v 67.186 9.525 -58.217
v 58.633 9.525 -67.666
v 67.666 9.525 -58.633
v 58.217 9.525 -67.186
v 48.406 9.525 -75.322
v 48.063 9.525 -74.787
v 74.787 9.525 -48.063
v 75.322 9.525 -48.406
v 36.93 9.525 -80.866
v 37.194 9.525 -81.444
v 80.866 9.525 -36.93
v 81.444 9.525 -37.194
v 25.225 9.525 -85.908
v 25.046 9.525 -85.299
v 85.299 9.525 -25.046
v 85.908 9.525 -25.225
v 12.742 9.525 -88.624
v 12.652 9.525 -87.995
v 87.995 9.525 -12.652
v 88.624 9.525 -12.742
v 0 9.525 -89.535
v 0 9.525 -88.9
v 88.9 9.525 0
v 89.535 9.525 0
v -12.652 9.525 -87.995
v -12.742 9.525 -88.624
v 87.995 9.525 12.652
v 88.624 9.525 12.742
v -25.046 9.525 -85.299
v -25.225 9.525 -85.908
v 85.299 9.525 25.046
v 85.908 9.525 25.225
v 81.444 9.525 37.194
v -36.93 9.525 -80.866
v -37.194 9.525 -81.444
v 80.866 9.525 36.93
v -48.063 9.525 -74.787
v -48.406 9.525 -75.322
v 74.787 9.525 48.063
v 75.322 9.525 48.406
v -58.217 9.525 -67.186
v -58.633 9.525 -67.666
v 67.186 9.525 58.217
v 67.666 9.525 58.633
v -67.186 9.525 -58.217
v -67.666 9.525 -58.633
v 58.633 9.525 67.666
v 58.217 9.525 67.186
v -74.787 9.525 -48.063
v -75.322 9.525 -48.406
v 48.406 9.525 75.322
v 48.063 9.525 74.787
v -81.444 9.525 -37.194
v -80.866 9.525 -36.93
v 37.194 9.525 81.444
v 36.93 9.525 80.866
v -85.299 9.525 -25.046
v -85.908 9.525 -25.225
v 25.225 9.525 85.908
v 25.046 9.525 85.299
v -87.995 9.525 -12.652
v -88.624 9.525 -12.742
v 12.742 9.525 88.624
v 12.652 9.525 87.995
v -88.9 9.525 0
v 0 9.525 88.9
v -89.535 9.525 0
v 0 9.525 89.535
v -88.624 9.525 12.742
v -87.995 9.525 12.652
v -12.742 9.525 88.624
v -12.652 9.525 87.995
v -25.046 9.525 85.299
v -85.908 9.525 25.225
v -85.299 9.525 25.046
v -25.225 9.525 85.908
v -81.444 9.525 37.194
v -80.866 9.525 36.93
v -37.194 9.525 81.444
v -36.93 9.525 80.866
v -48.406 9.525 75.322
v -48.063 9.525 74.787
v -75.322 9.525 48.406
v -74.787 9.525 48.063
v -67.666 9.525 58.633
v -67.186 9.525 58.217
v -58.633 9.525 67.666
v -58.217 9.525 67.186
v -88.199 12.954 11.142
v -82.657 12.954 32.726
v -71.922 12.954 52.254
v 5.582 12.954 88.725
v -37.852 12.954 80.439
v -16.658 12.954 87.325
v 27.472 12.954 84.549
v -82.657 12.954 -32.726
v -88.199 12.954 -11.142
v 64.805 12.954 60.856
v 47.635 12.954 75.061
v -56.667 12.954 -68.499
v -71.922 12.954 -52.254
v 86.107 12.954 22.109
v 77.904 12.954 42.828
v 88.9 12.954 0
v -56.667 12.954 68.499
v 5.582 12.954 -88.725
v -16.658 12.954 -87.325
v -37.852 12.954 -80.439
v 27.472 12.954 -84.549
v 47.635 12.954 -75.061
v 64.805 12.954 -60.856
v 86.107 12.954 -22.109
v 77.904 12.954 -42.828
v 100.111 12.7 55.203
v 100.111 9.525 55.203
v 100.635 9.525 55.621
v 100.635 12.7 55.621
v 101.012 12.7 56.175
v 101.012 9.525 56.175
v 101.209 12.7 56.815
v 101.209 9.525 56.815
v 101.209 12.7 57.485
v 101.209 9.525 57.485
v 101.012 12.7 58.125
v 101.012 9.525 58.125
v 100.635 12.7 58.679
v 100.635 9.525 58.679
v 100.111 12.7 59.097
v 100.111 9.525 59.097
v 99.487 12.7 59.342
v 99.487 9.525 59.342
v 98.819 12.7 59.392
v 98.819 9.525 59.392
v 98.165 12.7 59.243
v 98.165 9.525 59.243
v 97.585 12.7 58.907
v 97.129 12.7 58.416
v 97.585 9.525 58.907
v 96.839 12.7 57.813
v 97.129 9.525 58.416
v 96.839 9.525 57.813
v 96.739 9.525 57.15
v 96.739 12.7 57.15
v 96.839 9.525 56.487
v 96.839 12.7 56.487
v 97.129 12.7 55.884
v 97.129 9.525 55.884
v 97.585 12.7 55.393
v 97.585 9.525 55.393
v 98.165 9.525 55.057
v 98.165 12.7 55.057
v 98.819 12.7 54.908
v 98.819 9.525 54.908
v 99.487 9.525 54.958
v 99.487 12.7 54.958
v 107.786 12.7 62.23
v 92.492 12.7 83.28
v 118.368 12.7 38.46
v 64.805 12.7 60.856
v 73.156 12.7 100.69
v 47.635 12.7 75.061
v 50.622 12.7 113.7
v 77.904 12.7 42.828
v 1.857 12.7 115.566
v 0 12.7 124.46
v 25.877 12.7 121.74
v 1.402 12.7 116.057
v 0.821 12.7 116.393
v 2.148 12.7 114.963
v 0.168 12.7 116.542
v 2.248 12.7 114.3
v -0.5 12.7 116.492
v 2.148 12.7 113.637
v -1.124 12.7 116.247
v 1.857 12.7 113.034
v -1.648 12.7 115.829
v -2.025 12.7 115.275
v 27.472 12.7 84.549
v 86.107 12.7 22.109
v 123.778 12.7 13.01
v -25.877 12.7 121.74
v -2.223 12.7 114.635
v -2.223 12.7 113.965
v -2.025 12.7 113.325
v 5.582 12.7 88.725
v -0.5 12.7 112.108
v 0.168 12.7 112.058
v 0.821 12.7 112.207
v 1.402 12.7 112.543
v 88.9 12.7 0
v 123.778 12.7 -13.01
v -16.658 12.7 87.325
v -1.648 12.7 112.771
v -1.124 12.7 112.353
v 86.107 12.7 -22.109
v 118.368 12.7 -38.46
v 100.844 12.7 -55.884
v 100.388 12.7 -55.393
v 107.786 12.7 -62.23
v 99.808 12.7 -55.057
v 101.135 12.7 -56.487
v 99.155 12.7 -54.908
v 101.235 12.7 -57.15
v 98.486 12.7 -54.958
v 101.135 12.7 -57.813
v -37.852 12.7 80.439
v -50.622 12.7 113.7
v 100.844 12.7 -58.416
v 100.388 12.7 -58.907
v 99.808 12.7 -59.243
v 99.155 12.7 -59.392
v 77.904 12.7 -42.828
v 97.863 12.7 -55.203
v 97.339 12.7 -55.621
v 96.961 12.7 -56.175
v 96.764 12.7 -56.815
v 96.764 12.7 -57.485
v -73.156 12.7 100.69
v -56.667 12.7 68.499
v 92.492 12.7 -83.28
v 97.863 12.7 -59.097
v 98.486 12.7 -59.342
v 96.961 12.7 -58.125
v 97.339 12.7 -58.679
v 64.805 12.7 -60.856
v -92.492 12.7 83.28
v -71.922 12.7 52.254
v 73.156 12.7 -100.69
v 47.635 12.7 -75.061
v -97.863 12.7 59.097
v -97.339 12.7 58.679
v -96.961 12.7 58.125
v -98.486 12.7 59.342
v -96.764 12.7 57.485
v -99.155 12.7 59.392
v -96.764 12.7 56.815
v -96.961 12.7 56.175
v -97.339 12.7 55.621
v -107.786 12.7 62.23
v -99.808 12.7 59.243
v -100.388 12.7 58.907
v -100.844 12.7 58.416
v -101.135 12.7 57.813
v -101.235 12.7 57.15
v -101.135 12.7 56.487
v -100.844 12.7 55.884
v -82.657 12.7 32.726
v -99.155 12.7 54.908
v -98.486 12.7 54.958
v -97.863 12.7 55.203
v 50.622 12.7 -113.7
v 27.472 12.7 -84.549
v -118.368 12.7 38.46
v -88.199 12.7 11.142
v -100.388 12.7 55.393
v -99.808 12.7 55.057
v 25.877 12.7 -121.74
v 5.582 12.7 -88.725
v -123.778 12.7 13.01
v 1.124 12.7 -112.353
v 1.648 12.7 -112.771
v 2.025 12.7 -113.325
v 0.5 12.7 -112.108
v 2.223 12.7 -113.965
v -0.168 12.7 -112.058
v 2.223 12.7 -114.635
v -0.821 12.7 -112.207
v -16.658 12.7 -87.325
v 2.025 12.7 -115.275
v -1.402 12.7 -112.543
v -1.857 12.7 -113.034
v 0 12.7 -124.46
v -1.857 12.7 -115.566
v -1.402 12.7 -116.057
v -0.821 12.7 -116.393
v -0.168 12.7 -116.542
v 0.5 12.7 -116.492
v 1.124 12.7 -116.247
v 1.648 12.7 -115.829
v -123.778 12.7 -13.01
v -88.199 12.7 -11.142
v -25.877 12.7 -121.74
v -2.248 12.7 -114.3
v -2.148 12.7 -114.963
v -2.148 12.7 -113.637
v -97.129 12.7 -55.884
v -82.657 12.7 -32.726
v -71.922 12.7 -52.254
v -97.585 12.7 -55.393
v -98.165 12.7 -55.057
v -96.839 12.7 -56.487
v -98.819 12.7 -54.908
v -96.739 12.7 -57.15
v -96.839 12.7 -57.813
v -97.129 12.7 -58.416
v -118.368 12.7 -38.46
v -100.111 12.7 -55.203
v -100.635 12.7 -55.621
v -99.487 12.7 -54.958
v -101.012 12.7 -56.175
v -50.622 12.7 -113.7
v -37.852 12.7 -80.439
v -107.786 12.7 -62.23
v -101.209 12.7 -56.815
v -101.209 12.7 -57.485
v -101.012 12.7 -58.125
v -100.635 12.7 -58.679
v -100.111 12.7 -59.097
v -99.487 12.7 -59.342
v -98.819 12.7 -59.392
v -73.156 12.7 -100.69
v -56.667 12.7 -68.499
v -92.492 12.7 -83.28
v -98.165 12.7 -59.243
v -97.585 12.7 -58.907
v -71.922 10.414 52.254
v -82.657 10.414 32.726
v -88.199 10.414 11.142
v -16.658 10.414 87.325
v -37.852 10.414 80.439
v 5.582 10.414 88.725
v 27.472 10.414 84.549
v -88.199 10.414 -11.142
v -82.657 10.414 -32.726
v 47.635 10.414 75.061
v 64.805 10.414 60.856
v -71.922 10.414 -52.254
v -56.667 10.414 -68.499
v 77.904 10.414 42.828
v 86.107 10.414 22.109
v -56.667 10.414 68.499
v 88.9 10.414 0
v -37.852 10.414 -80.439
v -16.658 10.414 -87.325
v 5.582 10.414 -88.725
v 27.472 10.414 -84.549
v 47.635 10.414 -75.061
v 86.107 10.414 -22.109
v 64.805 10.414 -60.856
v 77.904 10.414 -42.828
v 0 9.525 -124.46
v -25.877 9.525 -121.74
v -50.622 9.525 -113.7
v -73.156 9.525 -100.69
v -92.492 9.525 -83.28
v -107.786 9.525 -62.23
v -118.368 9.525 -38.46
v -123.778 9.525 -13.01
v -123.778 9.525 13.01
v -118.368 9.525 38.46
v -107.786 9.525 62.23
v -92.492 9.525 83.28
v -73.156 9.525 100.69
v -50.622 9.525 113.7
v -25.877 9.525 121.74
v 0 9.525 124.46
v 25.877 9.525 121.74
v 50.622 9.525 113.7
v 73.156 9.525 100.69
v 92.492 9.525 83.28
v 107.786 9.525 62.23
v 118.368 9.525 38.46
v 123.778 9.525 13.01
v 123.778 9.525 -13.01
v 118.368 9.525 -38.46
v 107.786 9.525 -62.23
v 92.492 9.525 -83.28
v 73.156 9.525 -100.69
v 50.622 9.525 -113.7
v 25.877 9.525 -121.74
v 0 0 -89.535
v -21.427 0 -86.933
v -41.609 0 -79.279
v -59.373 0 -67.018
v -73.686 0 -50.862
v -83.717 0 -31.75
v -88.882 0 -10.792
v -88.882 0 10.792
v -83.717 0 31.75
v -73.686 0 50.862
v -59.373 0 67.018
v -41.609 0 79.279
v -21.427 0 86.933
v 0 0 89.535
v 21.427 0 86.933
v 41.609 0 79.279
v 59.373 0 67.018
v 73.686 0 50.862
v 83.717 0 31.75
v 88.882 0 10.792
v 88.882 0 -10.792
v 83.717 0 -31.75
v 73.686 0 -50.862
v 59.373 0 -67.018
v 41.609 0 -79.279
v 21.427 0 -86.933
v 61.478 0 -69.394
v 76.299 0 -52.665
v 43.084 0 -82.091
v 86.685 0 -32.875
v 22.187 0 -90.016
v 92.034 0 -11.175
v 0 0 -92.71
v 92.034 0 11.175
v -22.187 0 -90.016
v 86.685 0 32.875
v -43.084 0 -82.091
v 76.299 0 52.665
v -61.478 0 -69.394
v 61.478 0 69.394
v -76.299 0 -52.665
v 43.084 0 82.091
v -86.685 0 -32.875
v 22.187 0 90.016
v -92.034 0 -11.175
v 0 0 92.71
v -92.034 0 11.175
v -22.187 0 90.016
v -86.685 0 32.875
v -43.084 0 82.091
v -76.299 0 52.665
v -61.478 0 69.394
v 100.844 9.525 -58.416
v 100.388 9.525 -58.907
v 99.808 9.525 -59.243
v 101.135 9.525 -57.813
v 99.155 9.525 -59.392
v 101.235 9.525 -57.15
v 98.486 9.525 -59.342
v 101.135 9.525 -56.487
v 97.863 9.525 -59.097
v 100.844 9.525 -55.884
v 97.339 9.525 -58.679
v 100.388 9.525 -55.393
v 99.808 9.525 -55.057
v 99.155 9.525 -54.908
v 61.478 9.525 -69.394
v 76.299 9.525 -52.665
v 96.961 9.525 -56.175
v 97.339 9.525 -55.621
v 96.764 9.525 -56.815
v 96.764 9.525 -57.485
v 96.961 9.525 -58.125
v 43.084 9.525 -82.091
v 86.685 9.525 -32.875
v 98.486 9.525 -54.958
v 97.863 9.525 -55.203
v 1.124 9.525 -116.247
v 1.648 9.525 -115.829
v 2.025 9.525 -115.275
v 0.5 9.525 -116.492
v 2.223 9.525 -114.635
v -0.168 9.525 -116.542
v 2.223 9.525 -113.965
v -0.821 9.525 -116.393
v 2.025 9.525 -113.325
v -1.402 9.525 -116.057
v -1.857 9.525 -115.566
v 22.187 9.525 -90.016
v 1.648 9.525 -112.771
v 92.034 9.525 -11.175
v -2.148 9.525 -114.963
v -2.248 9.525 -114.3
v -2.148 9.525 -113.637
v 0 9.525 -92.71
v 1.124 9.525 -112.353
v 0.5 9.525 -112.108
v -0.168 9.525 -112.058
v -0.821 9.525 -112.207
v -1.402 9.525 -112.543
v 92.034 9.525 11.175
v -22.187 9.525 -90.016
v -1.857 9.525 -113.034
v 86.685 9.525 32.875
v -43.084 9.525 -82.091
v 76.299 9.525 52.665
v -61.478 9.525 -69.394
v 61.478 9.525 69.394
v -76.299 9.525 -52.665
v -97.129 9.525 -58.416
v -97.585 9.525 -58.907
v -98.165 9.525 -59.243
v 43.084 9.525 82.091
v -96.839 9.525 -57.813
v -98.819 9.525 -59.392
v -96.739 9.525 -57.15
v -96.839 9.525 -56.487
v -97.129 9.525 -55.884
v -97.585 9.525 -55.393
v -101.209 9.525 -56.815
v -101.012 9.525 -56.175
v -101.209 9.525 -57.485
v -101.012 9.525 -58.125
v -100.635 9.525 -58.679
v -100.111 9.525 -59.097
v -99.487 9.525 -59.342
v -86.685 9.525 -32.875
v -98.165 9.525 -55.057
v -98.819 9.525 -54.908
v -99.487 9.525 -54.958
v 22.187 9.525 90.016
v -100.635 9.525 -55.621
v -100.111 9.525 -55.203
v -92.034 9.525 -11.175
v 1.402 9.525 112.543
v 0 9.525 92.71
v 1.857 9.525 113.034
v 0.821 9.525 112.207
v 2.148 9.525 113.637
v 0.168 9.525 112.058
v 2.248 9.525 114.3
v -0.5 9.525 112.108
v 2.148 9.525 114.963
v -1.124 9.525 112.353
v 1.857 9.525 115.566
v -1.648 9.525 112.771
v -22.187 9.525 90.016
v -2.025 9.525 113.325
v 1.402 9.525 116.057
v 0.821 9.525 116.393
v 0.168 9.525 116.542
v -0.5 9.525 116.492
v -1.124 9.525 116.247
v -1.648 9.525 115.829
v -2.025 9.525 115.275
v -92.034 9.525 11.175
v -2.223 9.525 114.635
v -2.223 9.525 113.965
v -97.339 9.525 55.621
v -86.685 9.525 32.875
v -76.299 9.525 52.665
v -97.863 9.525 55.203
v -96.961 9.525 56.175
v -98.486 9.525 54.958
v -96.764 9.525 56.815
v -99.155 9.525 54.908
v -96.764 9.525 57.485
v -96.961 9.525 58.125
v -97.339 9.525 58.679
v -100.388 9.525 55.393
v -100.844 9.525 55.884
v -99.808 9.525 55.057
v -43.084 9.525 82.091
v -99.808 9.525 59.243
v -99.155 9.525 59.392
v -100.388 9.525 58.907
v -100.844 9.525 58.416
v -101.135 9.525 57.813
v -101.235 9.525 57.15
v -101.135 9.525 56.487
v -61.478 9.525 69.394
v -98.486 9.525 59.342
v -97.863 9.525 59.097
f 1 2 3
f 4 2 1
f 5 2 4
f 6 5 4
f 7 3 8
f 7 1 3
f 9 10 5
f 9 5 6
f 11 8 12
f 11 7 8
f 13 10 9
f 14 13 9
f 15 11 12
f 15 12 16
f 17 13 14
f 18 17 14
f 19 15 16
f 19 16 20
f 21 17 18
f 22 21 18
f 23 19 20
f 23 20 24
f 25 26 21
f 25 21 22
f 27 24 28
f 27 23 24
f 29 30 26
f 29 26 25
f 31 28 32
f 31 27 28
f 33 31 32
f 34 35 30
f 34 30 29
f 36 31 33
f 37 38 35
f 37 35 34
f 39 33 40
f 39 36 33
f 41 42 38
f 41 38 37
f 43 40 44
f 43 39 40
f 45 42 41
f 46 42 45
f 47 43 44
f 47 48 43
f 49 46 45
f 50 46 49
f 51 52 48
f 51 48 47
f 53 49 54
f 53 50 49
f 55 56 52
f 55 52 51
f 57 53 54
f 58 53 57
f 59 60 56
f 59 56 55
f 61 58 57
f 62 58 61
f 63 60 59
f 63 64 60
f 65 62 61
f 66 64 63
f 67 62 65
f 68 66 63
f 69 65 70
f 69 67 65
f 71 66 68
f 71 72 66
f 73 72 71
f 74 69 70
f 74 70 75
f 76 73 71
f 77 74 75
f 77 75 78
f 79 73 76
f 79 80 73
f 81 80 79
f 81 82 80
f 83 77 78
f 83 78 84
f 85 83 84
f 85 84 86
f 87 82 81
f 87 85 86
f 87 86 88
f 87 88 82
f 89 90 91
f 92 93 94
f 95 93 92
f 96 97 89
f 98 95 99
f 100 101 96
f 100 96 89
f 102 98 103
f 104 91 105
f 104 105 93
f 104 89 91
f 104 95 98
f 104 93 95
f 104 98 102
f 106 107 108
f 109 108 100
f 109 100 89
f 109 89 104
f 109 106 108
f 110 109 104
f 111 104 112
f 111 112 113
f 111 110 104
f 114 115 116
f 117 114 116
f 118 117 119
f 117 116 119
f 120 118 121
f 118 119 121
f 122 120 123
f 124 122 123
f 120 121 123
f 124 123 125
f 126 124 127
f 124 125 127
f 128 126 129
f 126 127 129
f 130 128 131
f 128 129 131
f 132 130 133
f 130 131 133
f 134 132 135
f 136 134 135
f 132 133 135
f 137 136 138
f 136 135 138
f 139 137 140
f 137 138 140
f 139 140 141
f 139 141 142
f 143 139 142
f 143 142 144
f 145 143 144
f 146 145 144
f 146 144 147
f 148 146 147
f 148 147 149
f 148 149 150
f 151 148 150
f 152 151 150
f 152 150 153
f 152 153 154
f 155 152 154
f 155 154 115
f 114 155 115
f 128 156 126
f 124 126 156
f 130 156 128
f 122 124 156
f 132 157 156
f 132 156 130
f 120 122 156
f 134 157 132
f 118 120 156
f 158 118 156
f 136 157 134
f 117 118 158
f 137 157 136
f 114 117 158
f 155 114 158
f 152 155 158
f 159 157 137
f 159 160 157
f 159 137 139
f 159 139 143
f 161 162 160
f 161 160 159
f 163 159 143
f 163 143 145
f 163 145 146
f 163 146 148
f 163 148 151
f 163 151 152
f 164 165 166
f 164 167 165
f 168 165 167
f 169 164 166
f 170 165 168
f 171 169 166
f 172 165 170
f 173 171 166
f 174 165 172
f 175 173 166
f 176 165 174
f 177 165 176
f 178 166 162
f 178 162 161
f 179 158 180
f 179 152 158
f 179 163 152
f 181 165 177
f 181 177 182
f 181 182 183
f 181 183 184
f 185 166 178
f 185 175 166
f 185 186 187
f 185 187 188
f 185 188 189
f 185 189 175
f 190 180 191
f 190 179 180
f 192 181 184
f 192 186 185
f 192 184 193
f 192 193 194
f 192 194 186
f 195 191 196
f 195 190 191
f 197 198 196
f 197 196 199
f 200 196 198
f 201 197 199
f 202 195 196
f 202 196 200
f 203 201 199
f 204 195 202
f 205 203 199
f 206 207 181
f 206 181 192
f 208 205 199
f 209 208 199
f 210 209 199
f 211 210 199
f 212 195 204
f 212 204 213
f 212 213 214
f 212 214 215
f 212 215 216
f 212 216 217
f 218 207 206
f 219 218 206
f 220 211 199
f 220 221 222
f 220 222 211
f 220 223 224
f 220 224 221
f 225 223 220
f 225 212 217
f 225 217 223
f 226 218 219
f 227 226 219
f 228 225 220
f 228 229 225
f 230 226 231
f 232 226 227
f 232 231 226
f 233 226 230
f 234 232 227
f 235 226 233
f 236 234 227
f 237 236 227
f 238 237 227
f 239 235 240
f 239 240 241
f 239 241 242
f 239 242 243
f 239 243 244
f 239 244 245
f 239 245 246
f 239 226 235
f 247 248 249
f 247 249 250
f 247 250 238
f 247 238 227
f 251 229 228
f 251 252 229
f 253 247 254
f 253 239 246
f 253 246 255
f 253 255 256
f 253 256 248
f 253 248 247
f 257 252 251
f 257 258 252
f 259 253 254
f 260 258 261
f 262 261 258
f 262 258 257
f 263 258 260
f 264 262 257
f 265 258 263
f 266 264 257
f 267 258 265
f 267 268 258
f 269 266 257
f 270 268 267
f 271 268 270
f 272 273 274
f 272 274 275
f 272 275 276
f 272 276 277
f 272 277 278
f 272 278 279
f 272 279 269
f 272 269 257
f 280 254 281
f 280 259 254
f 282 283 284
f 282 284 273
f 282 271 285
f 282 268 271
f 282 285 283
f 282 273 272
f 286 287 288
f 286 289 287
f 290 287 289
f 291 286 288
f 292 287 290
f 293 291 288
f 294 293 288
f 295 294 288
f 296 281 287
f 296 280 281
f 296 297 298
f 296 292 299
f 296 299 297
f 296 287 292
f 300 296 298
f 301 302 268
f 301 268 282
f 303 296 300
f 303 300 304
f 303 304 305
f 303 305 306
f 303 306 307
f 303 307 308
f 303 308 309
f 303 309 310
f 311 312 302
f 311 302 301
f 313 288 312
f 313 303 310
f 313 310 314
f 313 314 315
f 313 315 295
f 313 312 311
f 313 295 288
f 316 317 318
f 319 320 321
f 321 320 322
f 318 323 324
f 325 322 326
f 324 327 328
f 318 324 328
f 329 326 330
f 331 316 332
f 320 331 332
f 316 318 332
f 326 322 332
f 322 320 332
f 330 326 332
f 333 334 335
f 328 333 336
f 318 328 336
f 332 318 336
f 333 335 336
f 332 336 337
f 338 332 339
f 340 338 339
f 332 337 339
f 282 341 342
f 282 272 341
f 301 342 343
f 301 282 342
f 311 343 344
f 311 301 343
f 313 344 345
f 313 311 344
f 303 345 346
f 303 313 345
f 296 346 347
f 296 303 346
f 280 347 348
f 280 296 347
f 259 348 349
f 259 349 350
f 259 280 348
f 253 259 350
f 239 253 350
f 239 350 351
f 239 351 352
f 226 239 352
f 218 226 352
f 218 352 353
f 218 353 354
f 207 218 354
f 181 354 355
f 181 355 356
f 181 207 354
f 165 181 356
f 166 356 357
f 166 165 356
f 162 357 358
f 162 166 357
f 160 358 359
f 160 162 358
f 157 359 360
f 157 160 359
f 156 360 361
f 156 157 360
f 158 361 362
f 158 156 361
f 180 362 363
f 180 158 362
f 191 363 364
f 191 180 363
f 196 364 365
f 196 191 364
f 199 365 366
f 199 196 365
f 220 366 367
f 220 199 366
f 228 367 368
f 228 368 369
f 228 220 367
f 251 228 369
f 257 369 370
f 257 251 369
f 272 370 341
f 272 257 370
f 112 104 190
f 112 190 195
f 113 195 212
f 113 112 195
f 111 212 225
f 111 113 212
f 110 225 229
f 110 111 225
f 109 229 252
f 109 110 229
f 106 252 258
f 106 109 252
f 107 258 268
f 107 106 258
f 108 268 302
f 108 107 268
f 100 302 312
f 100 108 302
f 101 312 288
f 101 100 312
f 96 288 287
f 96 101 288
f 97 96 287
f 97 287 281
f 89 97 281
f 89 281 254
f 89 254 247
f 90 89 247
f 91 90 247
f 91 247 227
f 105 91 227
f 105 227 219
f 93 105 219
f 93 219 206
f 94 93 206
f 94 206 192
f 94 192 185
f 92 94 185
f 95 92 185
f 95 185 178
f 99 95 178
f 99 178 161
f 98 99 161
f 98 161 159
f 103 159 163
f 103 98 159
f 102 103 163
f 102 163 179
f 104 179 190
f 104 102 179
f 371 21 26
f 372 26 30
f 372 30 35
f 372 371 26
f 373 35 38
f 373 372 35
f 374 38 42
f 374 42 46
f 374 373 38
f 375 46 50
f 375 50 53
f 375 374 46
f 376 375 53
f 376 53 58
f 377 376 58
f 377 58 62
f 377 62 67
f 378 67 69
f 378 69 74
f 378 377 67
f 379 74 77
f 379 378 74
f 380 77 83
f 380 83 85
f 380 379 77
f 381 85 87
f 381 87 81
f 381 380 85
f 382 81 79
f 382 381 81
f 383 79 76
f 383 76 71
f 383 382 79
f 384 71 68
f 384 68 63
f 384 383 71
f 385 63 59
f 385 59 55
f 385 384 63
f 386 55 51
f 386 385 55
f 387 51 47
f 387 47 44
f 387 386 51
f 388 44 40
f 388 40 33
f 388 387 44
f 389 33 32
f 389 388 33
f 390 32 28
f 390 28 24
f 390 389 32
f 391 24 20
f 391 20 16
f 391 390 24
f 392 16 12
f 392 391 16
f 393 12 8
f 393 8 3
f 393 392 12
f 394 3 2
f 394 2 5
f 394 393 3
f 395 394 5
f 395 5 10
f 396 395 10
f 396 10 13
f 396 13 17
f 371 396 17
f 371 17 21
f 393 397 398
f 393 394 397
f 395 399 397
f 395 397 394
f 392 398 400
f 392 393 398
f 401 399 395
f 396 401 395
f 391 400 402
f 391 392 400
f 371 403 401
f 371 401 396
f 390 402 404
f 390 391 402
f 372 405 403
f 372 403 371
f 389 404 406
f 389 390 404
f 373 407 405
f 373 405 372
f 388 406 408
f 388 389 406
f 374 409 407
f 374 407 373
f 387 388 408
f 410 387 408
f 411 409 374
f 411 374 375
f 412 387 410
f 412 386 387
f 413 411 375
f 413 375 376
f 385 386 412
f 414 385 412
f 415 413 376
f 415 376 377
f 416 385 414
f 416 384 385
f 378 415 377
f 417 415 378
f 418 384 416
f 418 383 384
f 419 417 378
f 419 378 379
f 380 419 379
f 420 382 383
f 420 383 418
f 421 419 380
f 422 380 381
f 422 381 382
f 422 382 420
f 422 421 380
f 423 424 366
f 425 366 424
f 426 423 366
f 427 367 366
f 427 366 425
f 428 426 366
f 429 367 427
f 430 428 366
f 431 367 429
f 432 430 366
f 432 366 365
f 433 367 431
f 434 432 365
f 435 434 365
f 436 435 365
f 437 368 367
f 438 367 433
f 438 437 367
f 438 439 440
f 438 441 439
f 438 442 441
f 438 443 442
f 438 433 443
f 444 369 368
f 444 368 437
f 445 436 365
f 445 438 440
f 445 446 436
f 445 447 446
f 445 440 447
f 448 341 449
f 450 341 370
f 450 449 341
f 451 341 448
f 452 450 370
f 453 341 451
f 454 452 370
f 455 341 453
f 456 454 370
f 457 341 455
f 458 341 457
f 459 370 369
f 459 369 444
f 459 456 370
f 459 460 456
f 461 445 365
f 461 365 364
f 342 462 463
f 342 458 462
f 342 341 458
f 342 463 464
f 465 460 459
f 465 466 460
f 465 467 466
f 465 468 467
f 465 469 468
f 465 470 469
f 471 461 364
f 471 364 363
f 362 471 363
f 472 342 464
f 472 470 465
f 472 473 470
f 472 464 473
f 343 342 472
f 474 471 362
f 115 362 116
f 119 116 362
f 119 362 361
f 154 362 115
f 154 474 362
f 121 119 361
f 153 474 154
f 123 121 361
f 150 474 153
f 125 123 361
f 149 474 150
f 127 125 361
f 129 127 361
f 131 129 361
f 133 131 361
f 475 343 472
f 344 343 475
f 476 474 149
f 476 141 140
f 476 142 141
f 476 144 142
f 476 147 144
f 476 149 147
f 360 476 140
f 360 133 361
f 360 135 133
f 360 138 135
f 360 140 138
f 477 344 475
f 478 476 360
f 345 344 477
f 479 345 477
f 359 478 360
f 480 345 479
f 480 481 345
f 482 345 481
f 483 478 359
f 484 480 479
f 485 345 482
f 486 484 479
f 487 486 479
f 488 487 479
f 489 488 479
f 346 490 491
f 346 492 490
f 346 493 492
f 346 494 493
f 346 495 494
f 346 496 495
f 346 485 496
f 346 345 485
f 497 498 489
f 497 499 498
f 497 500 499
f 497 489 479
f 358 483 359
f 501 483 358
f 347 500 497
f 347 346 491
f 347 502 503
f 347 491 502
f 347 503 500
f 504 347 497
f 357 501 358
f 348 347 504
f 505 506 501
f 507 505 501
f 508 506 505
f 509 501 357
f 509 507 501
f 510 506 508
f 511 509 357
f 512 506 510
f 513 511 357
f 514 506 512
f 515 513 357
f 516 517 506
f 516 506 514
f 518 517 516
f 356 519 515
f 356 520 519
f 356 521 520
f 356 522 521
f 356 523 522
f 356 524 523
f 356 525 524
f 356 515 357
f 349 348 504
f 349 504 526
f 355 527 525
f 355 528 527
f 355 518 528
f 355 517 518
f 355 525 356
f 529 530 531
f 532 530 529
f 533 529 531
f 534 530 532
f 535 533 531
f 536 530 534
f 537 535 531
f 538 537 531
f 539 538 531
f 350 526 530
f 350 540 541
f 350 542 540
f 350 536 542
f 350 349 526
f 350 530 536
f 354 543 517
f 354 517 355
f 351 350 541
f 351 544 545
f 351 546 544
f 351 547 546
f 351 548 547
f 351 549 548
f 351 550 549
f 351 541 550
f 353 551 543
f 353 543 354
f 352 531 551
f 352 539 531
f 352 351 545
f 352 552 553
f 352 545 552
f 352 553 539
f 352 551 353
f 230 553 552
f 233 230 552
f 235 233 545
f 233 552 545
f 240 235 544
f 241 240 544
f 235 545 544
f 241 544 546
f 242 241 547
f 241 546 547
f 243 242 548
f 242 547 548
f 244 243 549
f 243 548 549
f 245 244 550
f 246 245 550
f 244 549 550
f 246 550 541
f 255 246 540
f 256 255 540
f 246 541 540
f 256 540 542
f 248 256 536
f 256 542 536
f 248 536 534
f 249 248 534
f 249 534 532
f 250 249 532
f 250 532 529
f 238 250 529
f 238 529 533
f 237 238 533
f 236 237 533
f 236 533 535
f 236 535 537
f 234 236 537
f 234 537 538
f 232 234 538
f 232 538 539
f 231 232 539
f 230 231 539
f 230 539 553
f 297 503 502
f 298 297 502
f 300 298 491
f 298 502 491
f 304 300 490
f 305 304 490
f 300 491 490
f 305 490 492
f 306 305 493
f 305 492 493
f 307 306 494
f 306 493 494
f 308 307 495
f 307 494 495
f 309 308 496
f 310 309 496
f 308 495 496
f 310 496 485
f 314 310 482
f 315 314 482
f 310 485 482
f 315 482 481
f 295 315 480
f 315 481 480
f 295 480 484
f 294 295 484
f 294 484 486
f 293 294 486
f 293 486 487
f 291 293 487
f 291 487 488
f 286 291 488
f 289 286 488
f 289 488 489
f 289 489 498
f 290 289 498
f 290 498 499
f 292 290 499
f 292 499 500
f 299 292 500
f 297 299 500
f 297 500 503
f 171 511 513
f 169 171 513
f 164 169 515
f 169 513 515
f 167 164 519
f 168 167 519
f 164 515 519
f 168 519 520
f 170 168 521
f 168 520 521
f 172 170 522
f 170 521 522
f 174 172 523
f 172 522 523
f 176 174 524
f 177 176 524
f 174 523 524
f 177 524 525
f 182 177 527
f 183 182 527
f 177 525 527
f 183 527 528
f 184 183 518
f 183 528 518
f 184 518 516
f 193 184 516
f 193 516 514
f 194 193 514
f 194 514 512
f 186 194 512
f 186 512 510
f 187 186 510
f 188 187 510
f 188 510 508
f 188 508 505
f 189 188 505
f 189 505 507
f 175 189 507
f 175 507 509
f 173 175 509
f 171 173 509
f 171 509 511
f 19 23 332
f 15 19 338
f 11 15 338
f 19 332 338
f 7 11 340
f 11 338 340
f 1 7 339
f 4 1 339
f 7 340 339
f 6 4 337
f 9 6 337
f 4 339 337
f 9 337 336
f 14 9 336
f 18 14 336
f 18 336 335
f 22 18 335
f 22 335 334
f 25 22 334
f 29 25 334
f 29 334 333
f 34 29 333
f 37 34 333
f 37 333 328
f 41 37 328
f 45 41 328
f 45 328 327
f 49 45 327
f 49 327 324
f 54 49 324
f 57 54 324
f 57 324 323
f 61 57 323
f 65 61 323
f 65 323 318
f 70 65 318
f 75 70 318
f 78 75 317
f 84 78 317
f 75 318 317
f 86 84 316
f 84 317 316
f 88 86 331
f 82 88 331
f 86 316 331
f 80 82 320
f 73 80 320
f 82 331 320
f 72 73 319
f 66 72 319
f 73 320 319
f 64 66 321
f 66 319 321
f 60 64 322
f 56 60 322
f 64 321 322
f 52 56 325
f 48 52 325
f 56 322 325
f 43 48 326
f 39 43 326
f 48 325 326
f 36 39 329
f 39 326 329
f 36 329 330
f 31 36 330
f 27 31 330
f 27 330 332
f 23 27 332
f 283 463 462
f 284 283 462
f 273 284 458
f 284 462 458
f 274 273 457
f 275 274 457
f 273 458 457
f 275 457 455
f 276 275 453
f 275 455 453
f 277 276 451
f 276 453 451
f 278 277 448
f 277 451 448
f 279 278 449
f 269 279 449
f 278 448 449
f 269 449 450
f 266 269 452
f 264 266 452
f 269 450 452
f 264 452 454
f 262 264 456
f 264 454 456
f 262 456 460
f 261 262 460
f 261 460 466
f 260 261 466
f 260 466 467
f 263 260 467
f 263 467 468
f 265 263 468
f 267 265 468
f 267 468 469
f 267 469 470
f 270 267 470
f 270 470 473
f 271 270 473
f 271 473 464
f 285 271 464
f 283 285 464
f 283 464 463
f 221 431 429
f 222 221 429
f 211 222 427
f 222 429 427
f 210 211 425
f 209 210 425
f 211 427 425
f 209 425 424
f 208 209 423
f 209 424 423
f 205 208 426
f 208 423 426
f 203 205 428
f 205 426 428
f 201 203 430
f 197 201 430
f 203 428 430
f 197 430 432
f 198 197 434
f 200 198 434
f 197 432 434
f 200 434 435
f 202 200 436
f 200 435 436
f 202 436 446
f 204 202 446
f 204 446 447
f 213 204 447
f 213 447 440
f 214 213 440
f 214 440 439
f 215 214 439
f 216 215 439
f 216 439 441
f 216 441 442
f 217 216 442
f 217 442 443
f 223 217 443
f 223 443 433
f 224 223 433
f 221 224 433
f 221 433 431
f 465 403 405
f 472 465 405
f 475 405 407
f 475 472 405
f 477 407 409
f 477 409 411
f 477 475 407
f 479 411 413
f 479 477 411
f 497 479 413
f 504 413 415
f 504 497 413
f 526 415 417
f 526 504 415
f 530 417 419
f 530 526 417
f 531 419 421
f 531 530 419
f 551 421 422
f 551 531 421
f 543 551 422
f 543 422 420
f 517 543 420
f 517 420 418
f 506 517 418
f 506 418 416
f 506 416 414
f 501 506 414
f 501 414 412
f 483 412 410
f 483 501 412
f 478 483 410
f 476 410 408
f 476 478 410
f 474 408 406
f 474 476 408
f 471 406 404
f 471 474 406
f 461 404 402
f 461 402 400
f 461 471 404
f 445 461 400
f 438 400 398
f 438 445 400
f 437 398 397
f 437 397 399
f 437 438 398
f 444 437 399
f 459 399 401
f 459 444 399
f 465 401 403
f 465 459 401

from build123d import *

# Parameters (mm, degrees)
F_8_CLEARANCE_HOLE1_D     = 4.4958
F_8_CLEARANCE_HOLE1_DEPTH = 3.176
CIRPATTERN1_COUNT         = 6
SKETCH4_R                 = 88.9
CUT_EXTRUDE1_DEPTH        = 13.7
BOSS_EXTRUDE2_START       = 0.254
SKETCH5_R                 = 88.9
BOSS_EXTRUDE2_DEPTH       = 2.54


with BuildPart() as part:
    # Sketch1 → Revolve1 (revolve)
    with BuildSketch(Plane(origin=(0, 0, 0), x_dir=(0, 0, -1), z_dir=(1, 0, 0))):
        Polygon((89.535, 0), (92.71, 0), (92.71, 9.525), (124.46, 9.525), (124.46, 12.7), (0, 12.7), (0, 9.525), (89.535, 9.525), align=None)
    revolve(axis=Axis((0, 0, 0), (0, 1, 0)))

    # #8 Clearance Hole1
    with Locations(Plane(origin=(0, 12.7, 0), x_dir=(1, 0, 0), z_dir=(0, 1, 0))):
        with Locations((0, 114.3)):
            f_8_clearance_hole1 = Hole(F_8_CLEARANCE_HOLE1_D / 2, depth=F_8_CLEARANCE_HOLE1_DEPTH)

    # CirPattern1: #8 Clearance Hole1 ×6 about axis
    cirpattern1_axis = Axis((0, 0, 0), (0, 1, 0))
    for i in range(1, CIRPATTERN1_COUNT):
        add(f_8_clearance_hole1.rotate(cirpattern1_axis, i * 360 / CIRPATTERN1_COUNT), mode=Mode.SUBTRACT)

    # Sketch4 → Cut-Extrude1 (cut, through all)
    with BuildSketch(Plane(origin=(0, 12.7, 0), x_dir=(1, 0, 0), z_dir=(0, 1, 0))):
        Circle(SKETCH4_R)
    extrude(amount=-CUT_EXTRUDE1_DEPTH, mode=Mode.SUBTRACT)

    # Sketch5 → Boss-Extrude2 (add)
    with BuildSketch(Plane(origin=(0, 12.7, 0), x_dir=(1, 0, 0), z_dir=(0, 1, 0)).offset(BOSS_EXTRUDE2_START)):
        Circle(SKETCH5_R)
    extrude(amount=-BOSS_EXTRUDE2_DEPTH)


solid = part.part
